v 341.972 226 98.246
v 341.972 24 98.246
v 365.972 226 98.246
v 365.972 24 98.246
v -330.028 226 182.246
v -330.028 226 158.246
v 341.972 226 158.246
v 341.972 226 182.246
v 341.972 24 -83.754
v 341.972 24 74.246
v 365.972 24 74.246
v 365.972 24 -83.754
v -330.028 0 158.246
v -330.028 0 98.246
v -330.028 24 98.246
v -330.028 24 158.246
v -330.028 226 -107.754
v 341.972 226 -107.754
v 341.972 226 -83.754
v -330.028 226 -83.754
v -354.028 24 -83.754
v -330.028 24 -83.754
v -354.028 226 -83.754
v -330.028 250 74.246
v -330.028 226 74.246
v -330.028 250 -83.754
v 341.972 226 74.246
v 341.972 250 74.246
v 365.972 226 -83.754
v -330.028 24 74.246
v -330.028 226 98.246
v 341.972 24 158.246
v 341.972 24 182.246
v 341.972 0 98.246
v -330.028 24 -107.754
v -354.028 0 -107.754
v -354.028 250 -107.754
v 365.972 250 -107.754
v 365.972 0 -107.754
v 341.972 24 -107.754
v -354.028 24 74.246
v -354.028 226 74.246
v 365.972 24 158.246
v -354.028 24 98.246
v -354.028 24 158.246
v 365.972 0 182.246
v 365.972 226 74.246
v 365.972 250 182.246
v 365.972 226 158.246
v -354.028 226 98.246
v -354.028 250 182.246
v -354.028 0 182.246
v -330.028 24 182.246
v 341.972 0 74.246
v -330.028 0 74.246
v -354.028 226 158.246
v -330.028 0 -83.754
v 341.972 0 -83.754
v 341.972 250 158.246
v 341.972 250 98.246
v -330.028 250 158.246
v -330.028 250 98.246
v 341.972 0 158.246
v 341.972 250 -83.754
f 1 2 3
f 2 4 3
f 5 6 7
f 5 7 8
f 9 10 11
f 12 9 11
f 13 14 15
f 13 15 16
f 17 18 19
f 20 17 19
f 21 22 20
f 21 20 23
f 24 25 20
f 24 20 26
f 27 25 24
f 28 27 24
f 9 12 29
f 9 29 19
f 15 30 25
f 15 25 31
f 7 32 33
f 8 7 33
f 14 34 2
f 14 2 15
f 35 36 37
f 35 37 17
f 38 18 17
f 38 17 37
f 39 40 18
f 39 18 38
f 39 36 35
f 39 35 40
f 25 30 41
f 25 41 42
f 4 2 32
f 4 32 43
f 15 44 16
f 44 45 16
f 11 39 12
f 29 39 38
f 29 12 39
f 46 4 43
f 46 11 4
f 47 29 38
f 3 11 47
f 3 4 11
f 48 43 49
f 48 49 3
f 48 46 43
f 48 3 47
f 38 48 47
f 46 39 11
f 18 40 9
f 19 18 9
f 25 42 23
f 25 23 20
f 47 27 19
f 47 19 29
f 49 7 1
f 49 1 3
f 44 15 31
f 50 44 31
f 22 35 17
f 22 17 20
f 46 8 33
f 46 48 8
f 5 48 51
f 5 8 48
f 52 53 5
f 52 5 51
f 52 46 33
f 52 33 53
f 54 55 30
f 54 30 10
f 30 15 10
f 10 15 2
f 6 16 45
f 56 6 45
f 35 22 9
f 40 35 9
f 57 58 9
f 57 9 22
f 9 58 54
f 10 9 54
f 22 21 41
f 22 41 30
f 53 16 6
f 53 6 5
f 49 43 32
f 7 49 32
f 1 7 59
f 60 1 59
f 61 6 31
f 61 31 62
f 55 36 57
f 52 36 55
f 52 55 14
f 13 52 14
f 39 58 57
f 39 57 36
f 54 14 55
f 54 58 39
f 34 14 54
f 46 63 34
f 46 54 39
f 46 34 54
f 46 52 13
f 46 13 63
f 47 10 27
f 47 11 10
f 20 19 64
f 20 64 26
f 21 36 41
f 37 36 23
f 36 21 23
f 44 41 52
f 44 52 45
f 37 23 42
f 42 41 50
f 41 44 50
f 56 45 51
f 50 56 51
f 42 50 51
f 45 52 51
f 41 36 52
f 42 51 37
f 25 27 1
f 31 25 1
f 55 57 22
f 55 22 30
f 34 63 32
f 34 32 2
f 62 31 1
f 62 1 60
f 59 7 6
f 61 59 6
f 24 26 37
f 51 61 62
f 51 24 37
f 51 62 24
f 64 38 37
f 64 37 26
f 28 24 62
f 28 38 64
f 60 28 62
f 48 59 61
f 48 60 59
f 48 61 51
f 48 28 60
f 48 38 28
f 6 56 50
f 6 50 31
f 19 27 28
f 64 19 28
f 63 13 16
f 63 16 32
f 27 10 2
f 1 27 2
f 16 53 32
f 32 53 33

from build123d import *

# Parameters (mm, degrees)
F0_W     = 24
F0_H     = 158
F1_DEPTH = 24
F2_W     = 24
F2_H     = 24
F3_DEPTH = 202
F4_W     = 24
F4_H     = 24
F5_DEPTH = 720
F6_W     = 24
F6_H     = 24
F7_DEPTH = 280


with BuildPart() as f1:
    # F0 (on Front) → F1 (new body)
    with BuildSketch(Plane.XZ):
        Polygon((-330.027685374, 158.2459368452), (-354.027685374, 158.2459368452), (-354.027685374, 110.2459368452), (-354.027685374, 86.2459368452), (365.972314626, 86.2459368452), (365.972314626, 98.2459368452), (341.972314626, 98.2459368452), (-330.027685374, 98.2459368452), align=None)
        Polygon((365.972314626, 110.2459368452), (365.972314626, 158.2459368452), (341.972314626, 158.2459368452), (341.972314626, 98.2459368452), (365.972314626, 98.2459368452), align=None)
        Polygon((-330.027685374, 74.2459368452), (-354.027685374, 74.2459368452), (-354.027685374, 62.2459368452), (-354.027685374, -83.7540631548), (-330.027685374, -83.7540631548), align=None)
        with Locations((353.972314626, -4.7540631548)):
            Rectangle(F0_W, F0_H)
        Polygon((365.972314626, 86.2459368452), (-354.027685374, 86.2459368452), (-354.027685374, 74.2459368452), (-330.027685374, 74.2459368452), (341.972314626, 74.2459368452), (365.972314626, 74.2459368452), align=None)
        Polygon((365.972314626, 182.2459368452), (-354.027685374, 182.2459368452), (-354.027685374, 158.2459368452), (-330.027685374, 158.2459368452), (341.972314626, 158.2459368452), (365.972314626, 158.2459368452), align=None)
        Polygon((-330.027685374, -83.7540631548), (-354.027685374, -83.7540631548), (-354.027685374, -107.7540631548), (365.972314626, -107.7540631548), (365.972314626, -83.7540631548), (341.972314626, -83.7540631548), align=None)
    extrude(amount=-F1_DEPTH)

    # F2 (on face) → F3 (join)
    with BuildSketch(Plane(origin=(0, 24, 0), x_dir=(-1, 0, 0), z_dir=(0, 1, 0))):
        with Locations((-353.972314626, 86.2459368452)):
            Rectangle(F2_W, F2_H)
        with Locations((-353.972314626, -95.7540631548)):
            Rectangle(F2_W, F2_H)
        with Locations((342.027685374, 170.2459368452)):
            Rectangle(F2_W, F2_H)
        with Locations((342.027685374, -95.7540631548)):
            Rectangle(F2_W, F2_H)
        with Locations((342.027685374, 86.2459368452)):
            Rectangle(F2_W, F2_H)
        with Locations((-353.972314626, 170.2459368452)):
            Rectangle(F2_W, F2_H)
    extrude(amount=F3_DEPTH)

    # F4 (on face) → F5 (join)
    with BuildSketch(Plane.YZ.offset(365.972314626)):
        with Locations((238, 86.2459368452)):
            Rectangle(F4_W, F4_H)
        with Locations((238, 170.2459368452)):
            Rectangle(F4_W, F4_H)
        with Locations((238, -95.7540631548)):
            Rectangle(F4_W, F4_H)
    extrude(amount=-F5_DEPTH)

    # F6 (on face) → F7 (join)
    with BuildSketch(Plane.XY.offset(182.2459368452)):
        with Locations((-342.027685374, 238)):
            Rectangle(F6_W, F6_H)
        with Locations((353.972314626, 238)):
            Rectangle(F6_W, F6_H)
    extrude(amount=-F7_DEPTH)


solid = f1.part
